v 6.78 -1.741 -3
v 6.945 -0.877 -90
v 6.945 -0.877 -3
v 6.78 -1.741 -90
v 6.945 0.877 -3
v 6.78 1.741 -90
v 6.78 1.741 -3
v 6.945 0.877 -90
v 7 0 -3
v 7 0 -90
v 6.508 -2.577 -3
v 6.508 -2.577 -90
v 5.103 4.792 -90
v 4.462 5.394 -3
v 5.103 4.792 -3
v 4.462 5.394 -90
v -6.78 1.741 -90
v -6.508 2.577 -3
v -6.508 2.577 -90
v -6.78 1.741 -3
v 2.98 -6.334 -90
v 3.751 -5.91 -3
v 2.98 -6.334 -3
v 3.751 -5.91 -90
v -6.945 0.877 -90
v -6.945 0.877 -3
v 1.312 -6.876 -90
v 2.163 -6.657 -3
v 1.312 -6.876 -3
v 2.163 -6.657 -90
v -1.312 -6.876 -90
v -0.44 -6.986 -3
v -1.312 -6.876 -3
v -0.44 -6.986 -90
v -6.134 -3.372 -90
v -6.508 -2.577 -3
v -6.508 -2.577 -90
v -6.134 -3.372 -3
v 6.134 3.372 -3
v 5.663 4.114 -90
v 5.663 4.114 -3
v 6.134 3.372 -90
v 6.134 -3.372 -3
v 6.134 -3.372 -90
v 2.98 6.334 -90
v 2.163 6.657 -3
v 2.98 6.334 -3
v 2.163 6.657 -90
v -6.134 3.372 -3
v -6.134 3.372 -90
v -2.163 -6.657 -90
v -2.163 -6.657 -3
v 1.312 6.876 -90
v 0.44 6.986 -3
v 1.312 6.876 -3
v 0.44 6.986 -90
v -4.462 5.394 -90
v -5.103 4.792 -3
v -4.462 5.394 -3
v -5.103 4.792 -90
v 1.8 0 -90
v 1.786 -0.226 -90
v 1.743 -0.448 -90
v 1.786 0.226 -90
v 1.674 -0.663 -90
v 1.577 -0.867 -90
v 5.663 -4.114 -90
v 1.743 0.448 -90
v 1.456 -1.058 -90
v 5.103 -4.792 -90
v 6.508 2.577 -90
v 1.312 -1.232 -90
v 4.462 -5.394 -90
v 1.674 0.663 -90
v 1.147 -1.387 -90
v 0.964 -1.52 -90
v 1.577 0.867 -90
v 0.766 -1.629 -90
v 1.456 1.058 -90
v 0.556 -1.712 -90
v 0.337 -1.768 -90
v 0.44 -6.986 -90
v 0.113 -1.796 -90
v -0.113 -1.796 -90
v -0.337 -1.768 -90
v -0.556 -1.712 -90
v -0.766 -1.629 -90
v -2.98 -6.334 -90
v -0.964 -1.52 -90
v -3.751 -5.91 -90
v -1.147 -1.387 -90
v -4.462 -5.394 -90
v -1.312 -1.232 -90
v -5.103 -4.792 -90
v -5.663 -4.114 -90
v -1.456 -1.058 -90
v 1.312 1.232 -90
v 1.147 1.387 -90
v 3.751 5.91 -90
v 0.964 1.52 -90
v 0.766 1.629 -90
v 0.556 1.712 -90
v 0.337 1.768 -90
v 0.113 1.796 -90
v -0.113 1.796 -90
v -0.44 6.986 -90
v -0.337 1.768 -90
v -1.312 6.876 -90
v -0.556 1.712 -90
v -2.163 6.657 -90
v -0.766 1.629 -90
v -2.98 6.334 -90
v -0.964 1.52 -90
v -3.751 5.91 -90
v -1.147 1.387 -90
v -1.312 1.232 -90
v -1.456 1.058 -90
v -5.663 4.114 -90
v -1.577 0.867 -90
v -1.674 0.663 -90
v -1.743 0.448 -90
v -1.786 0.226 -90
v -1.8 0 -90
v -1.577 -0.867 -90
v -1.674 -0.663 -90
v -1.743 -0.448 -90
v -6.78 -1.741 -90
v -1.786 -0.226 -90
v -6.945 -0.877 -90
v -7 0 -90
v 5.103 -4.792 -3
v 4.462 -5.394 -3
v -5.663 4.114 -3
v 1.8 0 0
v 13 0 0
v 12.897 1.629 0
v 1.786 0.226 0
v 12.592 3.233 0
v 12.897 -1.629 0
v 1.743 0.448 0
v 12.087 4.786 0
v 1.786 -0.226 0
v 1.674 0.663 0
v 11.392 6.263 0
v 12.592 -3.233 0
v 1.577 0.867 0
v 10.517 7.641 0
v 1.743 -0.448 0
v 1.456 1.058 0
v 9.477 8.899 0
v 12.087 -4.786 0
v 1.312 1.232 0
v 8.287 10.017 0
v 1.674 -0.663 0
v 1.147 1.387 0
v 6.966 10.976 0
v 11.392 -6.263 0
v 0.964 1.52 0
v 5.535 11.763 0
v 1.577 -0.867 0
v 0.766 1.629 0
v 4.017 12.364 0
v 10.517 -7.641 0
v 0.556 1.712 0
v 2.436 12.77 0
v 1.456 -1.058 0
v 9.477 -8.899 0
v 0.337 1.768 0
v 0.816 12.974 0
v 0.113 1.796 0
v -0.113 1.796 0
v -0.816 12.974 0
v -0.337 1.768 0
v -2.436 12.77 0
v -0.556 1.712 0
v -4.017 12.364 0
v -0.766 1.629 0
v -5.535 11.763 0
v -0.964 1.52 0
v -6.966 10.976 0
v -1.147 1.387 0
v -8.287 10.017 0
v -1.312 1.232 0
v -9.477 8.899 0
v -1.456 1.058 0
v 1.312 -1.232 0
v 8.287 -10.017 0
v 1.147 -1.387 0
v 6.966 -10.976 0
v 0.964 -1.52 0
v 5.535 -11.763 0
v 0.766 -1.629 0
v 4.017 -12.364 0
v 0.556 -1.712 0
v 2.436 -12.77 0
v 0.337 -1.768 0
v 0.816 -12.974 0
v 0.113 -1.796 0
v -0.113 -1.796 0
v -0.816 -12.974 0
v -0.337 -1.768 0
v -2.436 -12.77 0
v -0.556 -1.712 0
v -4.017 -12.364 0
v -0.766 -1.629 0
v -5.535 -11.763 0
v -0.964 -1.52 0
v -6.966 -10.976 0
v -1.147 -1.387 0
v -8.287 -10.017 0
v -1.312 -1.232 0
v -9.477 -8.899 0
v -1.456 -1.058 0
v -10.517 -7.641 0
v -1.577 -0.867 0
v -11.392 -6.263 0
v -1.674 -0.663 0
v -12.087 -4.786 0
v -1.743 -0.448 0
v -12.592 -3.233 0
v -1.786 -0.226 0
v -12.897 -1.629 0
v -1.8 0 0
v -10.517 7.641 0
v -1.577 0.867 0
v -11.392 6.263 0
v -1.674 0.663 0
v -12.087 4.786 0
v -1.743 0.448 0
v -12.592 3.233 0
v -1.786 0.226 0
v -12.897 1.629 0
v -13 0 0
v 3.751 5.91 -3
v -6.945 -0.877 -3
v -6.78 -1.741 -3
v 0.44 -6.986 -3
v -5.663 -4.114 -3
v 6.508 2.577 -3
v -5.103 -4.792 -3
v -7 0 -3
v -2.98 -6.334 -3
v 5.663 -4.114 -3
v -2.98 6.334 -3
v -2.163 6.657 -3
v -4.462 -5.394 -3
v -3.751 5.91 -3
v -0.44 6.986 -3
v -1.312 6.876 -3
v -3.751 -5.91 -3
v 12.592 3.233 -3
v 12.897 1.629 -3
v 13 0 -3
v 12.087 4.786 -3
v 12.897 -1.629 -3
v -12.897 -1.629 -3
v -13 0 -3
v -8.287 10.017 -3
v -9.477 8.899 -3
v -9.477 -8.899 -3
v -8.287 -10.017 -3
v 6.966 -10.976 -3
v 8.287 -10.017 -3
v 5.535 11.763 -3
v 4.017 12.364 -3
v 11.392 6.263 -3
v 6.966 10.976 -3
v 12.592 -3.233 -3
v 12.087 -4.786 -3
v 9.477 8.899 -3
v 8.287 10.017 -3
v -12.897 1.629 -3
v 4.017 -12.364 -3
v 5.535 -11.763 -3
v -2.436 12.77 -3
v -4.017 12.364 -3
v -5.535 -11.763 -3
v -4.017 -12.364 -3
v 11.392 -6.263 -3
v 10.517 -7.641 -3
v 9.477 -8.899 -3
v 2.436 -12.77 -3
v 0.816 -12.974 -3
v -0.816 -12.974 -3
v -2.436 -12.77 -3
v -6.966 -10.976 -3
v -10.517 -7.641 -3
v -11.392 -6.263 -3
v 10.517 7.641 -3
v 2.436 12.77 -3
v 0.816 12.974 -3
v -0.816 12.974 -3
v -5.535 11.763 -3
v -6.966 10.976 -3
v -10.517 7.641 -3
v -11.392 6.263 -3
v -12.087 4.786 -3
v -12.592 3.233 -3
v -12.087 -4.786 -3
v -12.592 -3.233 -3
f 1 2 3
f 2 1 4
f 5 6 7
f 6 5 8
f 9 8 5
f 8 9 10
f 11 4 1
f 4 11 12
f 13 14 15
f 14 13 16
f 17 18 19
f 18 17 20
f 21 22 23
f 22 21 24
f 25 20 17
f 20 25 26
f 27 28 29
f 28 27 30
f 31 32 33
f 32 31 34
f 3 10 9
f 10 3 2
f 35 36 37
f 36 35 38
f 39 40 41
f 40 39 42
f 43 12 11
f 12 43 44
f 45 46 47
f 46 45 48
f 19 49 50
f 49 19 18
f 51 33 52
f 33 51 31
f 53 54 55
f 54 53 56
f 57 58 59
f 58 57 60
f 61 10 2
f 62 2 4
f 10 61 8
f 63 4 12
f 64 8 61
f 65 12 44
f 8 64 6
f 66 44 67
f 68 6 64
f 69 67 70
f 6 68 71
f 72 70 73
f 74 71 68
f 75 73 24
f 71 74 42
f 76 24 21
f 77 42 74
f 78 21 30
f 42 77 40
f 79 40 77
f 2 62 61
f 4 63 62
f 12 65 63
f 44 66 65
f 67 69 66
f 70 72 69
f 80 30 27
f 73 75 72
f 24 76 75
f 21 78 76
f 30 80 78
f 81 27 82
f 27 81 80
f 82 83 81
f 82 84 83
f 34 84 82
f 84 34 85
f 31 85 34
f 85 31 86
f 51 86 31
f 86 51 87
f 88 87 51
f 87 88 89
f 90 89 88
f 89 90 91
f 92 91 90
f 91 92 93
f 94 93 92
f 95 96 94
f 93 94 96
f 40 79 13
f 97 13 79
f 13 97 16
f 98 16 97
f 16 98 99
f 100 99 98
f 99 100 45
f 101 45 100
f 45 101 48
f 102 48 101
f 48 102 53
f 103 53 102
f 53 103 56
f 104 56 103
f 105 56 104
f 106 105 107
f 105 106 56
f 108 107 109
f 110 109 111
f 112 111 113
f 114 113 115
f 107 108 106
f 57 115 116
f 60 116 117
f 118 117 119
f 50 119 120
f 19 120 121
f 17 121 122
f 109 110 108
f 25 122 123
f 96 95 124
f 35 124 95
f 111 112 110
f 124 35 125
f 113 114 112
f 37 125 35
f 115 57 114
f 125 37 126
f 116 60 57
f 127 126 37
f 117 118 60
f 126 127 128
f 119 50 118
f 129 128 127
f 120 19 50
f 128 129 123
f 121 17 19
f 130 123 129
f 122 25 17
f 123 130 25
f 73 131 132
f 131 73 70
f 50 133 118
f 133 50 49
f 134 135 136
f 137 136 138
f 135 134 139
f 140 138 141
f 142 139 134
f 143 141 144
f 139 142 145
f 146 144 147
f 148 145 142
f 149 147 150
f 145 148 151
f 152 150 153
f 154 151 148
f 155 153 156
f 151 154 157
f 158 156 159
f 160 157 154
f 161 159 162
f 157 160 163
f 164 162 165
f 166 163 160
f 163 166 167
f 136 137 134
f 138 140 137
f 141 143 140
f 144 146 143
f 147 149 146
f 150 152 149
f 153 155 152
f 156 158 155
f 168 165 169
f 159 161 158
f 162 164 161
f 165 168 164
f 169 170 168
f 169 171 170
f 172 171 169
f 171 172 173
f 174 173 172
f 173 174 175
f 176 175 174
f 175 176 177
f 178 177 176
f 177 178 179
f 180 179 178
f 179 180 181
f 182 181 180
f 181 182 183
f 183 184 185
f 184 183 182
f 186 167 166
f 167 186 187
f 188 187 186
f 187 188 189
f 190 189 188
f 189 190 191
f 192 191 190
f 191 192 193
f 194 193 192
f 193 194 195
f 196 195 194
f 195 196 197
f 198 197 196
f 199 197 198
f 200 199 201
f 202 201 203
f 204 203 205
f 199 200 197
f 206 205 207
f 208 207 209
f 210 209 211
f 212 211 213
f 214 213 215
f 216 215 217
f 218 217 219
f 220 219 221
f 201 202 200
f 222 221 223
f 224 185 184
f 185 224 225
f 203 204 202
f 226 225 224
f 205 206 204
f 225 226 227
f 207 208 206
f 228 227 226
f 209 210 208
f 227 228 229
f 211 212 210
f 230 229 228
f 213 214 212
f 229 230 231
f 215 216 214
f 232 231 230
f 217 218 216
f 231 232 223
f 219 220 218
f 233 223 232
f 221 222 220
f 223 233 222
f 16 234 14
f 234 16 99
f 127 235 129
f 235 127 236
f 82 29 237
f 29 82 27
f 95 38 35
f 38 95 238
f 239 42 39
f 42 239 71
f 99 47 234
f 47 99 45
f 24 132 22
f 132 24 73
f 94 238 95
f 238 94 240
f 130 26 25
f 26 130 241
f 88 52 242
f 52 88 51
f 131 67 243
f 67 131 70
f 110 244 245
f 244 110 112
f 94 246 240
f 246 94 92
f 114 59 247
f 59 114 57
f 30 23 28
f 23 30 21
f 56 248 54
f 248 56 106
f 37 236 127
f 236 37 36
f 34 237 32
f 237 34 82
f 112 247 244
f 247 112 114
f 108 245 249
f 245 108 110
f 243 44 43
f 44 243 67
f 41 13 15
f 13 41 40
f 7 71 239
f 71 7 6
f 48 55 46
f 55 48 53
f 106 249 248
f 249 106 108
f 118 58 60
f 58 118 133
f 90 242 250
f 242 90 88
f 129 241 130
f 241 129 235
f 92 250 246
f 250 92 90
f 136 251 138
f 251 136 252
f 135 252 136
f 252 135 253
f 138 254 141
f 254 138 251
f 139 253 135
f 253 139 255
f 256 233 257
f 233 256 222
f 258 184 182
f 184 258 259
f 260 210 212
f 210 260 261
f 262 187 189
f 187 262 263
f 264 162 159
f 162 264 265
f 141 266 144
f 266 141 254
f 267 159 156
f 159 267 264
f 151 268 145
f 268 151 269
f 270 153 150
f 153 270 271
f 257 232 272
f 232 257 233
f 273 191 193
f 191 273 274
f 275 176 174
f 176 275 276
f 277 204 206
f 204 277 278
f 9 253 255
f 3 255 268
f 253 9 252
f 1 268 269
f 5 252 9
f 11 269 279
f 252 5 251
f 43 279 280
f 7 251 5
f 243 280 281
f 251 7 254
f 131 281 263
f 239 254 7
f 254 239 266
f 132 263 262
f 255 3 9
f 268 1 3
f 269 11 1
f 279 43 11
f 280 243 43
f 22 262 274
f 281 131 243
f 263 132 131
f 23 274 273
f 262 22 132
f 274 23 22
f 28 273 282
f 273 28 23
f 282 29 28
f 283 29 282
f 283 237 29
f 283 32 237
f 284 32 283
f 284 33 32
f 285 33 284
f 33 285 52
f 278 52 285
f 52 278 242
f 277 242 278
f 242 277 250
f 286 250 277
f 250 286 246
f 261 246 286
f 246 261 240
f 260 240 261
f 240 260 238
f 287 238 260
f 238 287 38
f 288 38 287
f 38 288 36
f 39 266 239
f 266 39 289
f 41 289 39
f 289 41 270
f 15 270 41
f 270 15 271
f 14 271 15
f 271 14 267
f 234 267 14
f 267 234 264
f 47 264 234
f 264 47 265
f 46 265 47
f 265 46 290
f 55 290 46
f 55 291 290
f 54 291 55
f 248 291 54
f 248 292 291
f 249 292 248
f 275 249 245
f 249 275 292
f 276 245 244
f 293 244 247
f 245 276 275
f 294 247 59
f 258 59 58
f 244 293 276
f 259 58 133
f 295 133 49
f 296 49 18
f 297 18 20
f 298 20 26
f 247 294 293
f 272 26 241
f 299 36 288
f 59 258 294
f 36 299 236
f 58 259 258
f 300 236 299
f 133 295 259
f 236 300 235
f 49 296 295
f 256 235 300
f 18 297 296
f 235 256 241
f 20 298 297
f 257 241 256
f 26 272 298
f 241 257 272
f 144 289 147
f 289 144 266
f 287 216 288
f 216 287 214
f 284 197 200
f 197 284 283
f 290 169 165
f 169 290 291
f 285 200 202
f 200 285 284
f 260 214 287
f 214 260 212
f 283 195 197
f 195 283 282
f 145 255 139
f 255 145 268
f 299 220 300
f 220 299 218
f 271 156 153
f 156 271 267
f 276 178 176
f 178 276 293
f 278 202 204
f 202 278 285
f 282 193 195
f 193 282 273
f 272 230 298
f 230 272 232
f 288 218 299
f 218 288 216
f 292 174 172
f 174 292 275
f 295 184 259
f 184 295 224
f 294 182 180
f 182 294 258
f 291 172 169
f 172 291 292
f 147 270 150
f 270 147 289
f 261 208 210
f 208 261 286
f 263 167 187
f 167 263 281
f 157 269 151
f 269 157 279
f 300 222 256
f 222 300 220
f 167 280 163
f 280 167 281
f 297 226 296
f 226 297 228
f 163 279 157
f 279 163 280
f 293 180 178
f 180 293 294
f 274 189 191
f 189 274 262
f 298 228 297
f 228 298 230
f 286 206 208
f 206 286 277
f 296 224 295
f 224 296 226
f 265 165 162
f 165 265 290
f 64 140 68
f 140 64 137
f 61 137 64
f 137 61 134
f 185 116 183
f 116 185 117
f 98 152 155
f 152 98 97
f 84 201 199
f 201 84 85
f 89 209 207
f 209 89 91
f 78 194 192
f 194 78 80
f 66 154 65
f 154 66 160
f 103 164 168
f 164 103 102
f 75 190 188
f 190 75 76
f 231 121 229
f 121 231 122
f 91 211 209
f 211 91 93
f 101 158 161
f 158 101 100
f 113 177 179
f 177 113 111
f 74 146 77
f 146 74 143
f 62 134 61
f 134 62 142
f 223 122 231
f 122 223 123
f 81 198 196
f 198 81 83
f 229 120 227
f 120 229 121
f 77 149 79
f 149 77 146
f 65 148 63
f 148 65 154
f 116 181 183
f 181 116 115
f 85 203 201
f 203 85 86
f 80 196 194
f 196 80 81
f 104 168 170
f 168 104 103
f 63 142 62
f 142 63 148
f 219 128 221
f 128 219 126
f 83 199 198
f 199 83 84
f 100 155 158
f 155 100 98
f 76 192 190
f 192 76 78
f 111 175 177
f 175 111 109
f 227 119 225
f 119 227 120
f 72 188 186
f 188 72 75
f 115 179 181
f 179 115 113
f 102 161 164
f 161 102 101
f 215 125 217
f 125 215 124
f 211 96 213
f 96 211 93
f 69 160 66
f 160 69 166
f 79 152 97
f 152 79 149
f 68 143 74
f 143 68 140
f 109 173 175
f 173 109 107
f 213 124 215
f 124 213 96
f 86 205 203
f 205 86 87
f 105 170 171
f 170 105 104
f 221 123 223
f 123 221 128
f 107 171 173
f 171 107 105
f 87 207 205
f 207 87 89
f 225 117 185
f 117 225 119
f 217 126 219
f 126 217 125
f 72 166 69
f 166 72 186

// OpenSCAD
$fn = 50;


difference() {
	union() {
		translate(v = [0, 0, -90.0000000000]) {
			cylinder(h = 90, r = 7.0000000000);
		}
		translate(v = [0, 0, -3.0000000000]) {
			cylinder(h = 3, r = 13.0000000000);
		}
	}
	union() {
		#translate(v = [0, 0, -90]) {
			cylinder(h = 90, r = 1.8000000000);
		}
	}
}
